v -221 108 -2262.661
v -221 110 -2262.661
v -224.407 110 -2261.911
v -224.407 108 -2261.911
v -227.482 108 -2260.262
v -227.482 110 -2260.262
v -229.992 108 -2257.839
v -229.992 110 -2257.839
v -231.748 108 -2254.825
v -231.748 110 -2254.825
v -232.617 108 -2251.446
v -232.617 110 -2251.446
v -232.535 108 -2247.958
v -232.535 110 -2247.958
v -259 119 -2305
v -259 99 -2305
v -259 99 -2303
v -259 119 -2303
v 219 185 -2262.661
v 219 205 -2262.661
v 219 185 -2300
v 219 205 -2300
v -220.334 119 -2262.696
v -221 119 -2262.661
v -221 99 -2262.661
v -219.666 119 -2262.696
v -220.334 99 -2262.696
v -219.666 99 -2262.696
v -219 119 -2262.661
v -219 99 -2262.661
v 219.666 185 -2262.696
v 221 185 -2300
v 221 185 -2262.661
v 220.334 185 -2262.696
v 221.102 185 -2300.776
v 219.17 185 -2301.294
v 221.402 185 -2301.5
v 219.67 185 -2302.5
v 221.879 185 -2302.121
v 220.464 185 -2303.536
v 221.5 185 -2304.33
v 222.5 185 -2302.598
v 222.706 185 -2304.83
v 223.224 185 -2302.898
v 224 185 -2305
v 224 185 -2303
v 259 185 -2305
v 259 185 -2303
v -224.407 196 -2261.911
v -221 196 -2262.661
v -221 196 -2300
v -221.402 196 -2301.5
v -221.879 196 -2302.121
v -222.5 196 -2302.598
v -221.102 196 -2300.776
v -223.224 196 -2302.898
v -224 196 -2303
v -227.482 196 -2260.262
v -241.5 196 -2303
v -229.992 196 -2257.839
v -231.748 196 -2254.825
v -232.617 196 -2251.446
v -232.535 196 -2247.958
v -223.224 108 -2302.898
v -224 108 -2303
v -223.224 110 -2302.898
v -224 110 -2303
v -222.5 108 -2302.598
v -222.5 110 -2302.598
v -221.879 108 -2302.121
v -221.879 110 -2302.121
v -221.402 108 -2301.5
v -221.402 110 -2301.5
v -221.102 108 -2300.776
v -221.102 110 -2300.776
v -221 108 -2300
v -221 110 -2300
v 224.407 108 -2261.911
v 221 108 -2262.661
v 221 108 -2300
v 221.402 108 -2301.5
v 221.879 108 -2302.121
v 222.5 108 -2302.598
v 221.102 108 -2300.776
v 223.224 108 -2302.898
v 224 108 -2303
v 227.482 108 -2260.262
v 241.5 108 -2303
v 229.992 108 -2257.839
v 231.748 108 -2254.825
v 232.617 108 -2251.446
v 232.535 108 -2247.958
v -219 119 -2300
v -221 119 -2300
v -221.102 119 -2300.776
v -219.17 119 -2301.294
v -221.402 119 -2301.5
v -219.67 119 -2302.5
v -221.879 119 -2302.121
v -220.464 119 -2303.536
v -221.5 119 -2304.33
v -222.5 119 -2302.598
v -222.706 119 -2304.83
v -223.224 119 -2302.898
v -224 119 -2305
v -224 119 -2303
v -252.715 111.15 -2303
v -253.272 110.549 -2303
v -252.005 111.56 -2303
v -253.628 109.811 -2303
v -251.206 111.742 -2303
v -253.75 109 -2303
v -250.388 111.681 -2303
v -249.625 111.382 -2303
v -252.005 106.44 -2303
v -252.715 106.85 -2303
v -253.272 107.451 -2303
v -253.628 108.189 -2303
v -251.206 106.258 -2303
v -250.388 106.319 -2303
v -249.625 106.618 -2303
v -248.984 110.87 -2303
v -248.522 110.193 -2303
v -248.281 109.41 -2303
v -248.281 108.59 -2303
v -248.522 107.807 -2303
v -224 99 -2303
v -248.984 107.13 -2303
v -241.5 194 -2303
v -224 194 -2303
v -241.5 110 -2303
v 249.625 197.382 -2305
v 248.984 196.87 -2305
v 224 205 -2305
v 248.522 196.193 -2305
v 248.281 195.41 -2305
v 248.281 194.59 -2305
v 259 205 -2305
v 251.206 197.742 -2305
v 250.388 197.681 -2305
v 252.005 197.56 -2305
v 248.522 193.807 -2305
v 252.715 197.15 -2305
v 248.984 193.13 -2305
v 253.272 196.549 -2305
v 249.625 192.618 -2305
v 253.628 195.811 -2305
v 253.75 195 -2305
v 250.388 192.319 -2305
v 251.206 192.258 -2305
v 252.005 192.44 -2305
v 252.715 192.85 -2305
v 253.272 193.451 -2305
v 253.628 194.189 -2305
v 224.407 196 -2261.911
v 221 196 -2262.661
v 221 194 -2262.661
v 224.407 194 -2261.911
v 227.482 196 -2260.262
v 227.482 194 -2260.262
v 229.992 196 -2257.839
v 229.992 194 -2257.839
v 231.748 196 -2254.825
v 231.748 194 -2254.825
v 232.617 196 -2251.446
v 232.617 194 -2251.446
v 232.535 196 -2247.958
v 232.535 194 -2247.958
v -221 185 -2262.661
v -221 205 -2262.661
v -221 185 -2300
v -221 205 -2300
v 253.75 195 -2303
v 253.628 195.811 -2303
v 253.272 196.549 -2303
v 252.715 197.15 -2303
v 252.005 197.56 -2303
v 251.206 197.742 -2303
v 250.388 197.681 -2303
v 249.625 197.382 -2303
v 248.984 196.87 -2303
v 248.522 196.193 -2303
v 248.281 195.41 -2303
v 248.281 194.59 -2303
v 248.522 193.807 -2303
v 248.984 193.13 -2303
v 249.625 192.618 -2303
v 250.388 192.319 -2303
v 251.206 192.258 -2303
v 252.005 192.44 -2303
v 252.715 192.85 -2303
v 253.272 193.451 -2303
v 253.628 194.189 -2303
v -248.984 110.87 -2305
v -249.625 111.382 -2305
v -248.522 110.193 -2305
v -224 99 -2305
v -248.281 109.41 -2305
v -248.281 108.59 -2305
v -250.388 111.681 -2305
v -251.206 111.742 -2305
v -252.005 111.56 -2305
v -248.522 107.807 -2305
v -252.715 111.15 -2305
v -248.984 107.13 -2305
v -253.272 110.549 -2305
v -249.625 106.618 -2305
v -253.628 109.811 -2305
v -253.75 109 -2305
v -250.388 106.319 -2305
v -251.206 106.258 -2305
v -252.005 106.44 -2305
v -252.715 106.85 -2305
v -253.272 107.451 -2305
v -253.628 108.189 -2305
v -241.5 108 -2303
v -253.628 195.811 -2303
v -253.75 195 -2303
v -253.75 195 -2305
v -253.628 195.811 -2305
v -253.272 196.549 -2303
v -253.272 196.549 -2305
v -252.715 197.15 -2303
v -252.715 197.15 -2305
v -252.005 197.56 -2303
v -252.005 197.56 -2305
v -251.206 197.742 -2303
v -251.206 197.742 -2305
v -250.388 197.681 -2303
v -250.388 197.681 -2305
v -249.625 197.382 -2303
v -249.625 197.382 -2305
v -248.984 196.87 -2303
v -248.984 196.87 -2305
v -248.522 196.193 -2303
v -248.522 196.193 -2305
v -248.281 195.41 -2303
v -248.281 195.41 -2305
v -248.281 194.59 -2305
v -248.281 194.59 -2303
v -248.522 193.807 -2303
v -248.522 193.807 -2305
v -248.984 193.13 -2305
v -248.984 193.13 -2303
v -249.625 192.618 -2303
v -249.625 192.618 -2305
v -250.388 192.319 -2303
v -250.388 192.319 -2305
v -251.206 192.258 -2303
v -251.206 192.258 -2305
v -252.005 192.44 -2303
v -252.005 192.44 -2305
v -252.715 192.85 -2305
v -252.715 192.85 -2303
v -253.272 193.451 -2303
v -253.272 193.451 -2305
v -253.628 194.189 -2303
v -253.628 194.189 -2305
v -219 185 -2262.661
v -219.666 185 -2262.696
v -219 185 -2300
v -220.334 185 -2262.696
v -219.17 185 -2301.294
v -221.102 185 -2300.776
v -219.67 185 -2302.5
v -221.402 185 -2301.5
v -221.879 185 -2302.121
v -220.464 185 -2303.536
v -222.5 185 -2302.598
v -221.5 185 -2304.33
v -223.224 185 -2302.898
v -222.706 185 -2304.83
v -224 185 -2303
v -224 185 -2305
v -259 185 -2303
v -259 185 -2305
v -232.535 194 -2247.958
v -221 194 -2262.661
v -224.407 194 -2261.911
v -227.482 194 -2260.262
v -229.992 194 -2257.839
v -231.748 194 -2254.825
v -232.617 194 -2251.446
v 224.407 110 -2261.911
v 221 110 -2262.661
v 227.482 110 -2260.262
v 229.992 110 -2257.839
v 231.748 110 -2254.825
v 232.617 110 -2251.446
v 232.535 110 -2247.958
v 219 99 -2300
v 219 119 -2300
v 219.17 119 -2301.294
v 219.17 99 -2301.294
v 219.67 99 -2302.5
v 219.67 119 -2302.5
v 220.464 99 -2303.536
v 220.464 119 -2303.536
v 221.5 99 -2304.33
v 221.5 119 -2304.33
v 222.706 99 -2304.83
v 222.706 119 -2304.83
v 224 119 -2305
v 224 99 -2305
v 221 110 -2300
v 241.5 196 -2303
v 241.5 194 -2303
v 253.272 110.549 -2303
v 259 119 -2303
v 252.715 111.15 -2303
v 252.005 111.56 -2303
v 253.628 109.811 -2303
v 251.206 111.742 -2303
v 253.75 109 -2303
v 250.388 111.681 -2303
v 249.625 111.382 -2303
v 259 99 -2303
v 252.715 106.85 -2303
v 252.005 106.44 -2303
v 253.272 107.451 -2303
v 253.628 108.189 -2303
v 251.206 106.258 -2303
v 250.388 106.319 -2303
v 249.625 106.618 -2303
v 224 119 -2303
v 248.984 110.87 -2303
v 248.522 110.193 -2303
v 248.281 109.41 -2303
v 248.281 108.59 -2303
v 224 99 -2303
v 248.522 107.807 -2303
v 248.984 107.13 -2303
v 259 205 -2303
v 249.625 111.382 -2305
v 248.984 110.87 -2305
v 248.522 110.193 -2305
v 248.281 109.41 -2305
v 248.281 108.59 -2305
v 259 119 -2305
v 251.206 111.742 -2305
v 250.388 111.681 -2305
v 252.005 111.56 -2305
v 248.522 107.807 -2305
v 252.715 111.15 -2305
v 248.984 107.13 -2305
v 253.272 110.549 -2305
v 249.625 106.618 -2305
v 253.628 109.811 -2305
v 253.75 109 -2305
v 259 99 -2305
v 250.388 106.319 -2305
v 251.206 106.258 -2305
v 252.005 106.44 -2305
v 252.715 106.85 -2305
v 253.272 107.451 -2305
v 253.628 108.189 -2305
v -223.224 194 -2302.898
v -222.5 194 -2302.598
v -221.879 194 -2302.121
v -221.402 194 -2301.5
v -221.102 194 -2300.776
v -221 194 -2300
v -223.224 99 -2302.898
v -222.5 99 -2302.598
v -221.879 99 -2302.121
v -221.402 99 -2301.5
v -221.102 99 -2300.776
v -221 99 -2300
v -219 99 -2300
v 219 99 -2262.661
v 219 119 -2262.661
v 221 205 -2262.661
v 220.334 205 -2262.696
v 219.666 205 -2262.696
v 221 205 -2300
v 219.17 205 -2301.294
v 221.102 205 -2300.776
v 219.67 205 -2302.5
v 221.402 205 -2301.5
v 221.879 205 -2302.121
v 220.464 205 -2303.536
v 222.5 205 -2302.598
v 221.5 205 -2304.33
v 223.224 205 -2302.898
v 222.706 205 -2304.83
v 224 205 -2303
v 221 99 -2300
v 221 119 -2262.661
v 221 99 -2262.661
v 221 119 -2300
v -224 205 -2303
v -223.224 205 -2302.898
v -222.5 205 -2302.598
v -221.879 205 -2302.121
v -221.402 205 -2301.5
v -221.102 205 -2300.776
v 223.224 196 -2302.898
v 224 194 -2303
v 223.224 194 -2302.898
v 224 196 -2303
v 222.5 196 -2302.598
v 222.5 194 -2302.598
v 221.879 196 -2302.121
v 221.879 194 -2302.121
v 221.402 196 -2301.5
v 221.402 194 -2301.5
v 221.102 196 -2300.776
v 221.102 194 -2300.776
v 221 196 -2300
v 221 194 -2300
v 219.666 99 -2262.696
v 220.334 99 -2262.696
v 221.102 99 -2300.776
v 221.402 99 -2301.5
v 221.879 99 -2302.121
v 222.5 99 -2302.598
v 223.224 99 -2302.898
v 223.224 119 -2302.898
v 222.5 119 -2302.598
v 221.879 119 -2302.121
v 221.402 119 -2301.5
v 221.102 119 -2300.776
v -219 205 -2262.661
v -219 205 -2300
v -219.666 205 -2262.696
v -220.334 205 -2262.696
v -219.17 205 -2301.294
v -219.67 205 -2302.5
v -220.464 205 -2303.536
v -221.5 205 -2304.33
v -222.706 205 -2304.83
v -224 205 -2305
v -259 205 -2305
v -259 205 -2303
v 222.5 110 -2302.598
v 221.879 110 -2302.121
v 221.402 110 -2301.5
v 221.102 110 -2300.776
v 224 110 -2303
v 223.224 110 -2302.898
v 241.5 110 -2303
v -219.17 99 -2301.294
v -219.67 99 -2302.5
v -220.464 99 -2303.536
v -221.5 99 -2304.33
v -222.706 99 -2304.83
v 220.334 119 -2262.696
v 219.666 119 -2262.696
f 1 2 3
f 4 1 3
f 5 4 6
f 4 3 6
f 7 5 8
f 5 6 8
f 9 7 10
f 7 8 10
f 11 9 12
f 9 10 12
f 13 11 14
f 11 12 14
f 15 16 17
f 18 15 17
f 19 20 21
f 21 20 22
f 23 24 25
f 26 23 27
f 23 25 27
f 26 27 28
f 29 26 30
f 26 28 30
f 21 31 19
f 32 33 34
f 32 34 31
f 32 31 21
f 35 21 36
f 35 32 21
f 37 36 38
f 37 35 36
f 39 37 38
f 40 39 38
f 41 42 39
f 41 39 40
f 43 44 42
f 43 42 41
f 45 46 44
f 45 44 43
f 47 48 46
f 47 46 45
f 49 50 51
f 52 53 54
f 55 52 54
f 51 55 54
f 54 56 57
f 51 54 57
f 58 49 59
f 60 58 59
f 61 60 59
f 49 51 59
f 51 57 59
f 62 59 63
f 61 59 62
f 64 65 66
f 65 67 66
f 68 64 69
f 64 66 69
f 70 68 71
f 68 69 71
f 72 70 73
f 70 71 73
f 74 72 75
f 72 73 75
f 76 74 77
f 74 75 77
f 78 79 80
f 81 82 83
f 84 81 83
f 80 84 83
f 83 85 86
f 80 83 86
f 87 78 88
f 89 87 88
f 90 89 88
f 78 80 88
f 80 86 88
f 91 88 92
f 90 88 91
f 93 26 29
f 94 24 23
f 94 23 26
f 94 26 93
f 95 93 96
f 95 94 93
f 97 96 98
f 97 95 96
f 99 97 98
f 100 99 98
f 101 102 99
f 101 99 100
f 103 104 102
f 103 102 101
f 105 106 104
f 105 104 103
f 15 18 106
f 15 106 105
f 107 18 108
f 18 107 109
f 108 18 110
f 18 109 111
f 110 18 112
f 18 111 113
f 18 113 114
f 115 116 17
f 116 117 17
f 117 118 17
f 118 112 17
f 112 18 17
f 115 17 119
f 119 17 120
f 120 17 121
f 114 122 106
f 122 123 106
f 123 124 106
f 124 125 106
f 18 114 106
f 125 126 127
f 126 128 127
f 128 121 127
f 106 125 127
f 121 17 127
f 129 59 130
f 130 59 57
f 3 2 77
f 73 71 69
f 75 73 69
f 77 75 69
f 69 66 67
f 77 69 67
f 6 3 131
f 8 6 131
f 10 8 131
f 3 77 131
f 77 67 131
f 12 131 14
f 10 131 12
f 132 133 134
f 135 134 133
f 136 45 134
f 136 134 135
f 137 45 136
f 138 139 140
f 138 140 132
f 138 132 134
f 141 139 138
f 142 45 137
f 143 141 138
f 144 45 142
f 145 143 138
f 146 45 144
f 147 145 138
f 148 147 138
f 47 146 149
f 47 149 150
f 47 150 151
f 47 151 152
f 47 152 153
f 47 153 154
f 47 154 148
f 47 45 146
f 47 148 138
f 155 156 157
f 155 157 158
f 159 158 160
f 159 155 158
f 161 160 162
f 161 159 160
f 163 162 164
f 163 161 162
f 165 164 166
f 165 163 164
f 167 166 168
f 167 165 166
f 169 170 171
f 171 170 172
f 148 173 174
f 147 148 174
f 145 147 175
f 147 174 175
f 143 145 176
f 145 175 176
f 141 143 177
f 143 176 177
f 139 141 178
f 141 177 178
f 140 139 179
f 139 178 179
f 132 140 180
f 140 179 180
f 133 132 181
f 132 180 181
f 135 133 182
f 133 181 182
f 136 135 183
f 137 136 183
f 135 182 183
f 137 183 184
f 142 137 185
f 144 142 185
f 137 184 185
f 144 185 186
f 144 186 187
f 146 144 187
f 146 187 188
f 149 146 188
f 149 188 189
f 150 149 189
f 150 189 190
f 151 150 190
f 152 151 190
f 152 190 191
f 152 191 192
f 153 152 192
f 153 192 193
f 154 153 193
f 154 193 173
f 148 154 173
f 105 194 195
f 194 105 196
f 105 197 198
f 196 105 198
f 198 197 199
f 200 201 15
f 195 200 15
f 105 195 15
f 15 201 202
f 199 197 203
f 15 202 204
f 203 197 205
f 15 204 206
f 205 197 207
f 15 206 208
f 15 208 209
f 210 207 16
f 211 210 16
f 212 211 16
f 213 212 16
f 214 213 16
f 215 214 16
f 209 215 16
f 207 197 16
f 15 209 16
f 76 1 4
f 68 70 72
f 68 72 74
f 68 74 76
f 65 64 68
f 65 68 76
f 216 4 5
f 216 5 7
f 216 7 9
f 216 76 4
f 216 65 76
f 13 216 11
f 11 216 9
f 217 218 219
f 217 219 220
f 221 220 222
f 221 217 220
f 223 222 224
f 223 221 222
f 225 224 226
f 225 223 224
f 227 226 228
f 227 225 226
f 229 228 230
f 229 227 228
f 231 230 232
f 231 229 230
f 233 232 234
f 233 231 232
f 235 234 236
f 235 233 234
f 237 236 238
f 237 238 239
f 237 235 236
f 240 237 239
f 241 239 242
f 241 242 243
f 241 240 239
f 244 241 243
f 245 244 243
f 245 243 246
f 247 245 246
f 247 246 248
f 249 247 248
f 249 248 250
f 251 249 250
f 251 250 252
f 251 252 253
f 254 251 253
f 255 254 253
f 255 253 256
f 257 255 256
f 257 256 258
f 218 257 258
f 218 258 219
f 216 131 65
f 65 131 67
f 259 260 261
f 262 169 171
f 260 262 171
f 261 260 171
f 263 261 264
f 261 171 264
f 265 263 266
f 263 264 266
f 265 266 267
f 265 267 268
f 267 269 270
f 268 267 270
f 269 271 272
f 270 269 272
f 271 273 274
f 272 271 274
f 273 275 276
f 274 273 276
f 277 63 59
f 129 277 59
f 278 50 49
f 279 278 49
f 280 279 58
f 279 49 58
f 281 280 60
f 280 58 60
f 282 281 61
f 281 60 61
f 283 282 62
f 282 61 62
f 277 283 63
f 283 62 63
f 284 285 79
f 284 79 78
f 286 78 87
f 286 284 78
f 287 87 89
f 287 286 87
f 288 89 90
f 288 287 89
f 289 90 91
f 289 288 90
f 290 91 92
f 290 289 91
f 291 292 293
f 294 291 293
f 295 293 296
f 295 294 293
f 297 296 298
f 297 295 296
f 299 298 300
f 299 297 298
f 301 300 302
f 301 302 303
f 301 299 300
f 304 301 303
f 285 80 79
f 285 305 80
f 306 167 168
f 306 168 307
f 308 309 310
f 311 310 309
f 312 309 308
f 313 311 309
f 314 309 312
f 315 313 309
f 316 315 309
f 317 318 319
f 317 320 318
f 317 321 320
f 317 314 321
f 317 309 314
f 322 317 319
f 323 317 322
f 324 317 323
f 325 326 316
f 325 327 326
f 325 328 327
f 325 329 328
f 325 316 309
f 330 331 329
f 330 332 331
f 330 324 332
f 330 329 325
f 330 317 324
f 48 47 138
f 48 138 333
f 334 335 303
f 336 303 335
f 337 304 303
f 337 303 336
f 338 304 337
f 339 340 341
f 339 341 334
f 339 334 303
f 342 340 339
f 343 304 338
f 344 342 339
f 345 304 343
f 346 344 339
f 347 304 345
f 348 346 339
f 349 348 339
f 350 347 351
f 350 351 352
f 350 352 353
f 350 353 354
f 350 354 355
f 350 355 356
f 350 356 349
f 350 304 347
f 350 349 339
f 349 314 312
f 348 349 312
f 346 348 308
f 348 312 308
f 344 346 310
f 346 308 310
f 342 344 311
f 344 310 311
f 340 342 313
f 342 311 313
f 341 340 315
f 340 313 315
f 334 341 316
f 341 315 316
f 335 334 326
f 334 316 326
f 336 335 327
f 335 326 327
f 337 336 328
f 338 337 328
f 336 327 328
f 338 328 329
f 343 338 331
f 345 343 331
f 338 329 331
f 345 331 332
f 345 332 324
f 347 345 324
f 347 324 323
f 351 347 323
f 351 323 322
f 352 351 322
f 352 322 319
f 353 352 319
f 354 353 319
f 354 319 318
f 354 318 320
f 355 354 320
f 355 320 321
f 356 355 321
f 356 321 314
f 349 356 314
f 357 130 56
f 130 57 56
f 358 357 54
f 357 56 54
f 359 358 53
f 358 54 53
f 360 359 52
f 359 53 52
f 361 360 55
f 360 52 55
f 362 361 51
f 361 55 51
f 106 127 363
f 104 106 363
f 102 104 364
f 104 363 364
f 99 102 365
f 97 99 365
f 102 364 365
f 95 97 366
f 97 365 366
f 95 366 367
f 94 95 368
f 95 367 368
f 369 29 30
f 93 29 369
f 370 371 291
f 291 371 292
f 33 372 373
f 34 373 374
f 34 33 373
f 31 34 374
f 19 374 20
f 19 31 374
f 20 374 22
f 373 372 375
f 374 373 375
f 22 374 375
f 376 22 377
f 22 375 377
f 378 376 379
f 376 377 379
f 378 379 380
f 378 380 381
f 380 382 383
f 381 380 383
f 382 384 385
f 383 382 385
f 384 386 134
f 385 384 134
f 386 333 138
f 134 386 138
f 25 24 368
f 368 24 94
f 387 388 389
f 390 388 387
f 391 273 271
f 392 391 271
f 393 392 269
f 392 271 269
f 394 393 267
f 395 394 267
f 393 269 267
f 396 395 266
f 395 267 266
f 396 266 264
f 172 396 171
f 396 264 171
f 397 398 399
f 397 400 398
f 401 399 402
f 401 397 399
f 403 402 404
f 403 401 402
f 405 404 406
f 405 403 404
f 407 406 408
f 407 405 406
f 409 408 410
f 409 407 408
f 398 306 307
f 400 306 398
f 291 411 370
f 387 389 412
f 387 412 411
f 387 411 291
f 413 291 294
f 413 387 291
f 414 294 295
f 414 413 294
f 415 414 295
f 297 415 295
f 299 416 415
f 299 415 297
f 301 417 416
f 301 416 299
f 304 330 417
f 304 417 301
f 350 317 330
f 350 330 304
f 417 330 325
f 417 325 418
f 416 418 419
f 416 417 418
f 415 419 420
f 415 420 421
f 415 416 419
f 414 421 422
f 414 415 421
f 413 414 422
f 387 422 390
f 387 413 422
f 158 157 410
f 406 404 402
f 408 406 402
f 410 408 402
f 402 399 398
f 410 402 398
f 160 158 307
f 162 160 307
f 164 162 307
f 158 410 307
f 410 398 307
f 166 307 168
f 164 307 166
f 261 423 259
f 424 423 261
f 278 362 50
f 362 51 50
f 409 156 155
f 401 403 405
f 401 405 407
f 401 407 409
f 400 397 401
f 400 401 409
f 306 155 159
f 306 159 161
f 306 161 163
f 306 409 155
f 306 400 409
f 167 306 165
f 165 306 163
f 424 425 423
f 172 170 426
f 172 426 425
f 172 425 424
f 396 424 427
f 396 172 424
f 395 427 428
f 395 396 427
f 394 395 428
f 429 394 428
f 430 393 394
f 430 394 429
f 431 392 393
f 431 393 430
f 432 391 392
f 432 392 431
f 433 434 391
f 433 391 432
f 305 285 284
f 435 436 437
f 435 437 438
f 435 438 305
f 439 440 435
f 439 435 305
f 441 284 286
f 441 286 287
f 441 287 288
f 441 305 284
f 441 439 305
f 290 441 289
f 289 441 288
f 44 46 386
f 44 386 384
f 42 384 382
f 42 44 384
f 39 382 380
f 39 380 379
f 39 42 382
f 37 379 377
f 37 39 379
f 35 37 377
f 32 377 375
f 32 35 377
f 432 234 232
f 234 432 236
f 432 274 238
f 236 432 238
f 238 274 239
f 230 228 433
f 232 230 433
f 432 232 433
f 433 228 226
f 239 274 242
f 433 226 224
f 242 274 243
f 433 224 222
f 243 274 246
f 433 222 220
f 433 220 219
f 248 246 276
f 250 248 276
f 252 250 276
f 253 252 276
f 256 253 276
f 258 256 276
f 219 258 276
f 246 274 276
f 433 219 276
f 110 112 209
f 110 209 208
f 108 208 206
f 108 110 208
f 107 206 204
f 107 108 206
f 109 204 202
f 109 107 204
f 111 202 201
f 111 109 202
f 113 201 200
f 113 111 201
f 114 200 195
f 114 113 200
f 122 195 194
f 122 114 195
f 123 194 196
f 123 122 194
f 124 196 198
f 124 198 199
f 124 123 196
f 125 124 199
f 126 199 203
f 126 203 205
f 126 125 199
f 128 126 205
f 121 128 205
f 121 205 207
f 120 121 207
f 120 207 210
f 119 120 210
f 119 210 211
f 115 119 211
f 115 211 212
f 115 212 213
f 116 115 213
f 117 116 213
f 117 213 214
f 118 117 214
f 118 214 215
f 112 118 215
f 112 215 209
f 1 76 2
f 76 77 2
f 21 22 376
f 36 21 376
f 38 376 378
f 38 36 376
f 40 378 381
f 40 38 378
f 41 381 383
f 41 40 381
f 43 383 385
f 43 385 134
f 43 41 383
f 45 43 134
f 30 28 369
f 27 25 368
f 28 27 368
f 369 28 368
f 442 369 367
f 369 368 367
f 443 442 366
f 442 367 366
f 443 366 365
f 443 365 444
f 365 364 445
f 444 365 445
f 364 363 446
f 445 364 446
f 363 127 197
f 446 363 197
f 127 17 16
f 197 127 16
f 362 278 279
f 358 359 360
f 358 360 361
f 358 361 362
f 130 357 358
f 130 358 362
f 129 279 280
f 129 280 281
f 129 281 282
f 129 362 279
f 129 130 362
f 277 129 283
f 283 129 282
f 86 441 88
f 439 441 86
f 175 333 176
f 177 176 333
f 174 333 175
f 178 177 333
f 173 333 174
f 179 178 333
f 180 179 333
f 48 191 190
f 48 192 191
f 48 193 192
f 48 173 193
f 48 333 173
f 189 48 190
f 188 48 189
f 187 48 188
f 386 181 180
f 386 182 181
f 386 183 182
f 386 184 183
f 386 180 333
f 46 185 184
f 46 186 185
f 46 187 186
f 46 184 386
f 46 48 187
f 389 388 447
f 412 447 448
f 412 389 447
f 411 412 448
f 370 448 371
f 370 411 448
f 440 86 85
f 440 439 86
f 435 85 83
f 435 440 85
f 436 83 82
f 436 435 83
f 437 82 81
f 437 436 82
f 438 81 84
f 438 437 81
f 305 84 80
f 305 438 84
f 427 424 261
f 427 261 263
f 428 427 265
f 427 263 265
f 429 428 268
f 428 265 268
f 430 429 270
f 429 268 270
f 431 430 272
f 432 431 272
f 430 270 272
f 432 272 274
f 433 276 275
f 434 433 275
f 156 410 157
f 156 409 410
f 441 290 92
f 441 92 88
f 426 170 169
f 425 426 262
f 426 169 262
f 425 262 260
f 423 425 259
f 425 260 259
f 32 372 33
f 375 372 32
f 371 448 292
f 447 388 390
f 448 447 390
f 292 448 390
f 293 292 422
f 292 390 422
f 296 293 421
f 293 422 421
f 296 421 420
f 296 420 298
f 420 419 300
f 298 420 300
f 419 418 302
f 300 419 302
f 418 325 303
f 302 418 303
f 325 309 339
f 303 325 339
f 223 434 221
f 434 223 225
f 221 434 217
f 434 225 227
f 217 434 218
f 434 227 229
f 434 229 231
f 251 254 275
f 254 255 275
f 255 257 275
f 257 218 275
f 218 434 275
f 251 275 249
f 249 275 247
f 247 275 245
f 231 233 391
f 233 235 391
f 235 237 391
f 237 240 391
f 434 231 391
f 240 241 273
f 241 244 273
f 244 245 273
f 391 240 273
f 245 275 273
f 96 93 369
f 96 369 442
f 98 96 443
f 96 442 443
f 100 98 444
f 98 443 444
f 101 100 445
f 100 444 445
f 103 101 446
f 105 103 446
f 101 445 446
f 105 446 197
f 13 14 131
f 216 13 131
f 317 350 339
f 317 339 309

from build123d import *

# Parameters (mm, degrees)
SKETCH3_W                = 50
SKETCH3_H                = 20
BASE_FLANGE1_DEPTH       = 2
EDGE_FLANGE1_DEPTH       = 20
BOSS_EXTRUDE2_DEPTH      = 1
SKETCH19_R               = 2.75
CUT_EXTRUDE1_DEPTH       = 48
INDENT1_START            = 185
INDENT1_DEPTH            = 20
BODY_DELETE_KEEP_START   = 185
BODY_DELETE_KEEP_1_DEPTH = 20
LPATTERN1_COUNT          = 2
LPATTERN1_PITCH          = 86


# Read off the part's stored shape, not the designer's step: Indent1, Body-Delete/Keep 1
# Sheet-metal steps are written as plain solids
with BuildPart() as part:
    # Sketch3 → Base-Flange1 (new body)
    with BuildSketch(Plane(origin=(221, 0, 0), x_dir=(0, 0, -1), z_dir=(1, 0, 0))):
        with Locations((2275, 195)):
            Rectangle(SKETCH3_W, SKETCH3_H)
    extrude(amount=-BASE_FLANGE1_DEPTH)

    # Edge-Flange1 section (across the edge) → Edge-Flange1 (add)
    with BuildSketch(Plane(origin=(221, 185, -2303), x_dir=(0, 0, 1), z_dir=(0, 1, 0))):
        with BuildLine():
            Line((-2, 3), (-2, 38))
            Line((-2, 38), (0, 38))
            Line((0, 38), (0, 3))
            ThreePointArc((0, 3), (0.878679656, 0.878679656), (3, 0))
            Line((3, 0), (3, -2))
            ThreePointArc((3, -2), (-0.535533906, -0.535533906), (-2, 3))
        make_face()
    extrude(amount=EDGE_FLANGE1_DEPTH)

    # Sketch19 → Cut-Extrude1 (cut)
    with BuildSketch(Plane.XY.offset(-2303)):
        with Locations((251, 195)):
            Circle(SKETCH19_R)
    extrude(amount=-CUT_EXTRUDE1_DEPTH, mode=Mode.SUBTRACT)

    # Indent1 outline → Indent1 (cut)
    with BuildSketch(Plane(origin=(0, 0, 0), x_dir=(1, 0, 0), z_dir=(0, 1, 0)).offset(INDENT1_START)):
        with BuildLine():
            Line((221, 2261.356055653), (221, 2262.660568708))
            ThreePointArc((221, 2262.660568708), (220, 2262.7), (219, 2262.660568708))
            Line((219, 2262.660568708), (219, 2261.356055653))
            ThreePointArc((219, 2261.356055653), (220, 2261.4), (221, 2261.356055653))
        make_face()
    extrude(amount=INDENT1_DEPTH, mode=Mode.SUBTRACT)

    # Body-Delete/Keep 1 outline → Body-Delete/Keep 1 (cut)
    with BuildSketch(Plane(origin=(0, 0, 0), x_dir=(1, 0, 0), z_dir=(0, 1, 0)).offset(BODY_DELETE_KEEP_START)):
        with BuildLine():
            ThreePointArc((221, 2261.356055653), (220, 2261.4), (219, 2261.356055653))
            Line((219, 2261.356055653), (219, 2250))
            Line((219, 2250), (221, 2250))
            Line((221, 2250), (221, 2261.356055653))
        make_face()
    extrude(amount=BODY_DELETE_KEEP_1_DEPTH, mode=Mode.SUBTRACT)


with BuildPart() as body_2:
    # Sketch11 → Boss-Extrude2 (new, symmetric)
    with BuildSketch(Plane(origin=(0, 195, 0), x_dir=(1, 0, 0), z_dir=(0, 1, 0))):
        with BuildLine():
            Line((221, 2300), (221, 2262.660568708))
            ThreePointArc((221, 2262.660568708), (229.991834673, 2257.839211686), (232.534814834, 2247.958329831))
            Line((232.534814834, 2247.958329831), (241.5, 2303))
            Line((241.5, 2303), (224, 2303))
            ThreePointArc((224, 2303), (221.878679656, 2302.121320344), (221, 2300))
        make_face()
    extrude(amount=BOSS_EXTRUDE2_DEPTH, both=True)


with BuildPart() as lpattern1_1:
    # LPattern1: pattern copy
    add(part.part.moved(Location(Vector(0, -1, 0) * (1 * LPATTERN1_PITCH))))


with BuildPart() as lpattern1_2:
    # LPattern1: pattern copy
    add(body_2.part.moved(Location(Vector(0, -1, 0) * (1 * LPATTERN1_PITCH))))


with BuildPart() as body_5:
    # Mirror1: mirrored copy
    add(part.part.mirror(Plane(origin=(0, 0, 0), x_dir=(0, 0, 1), z_dir=(1, 0, 0))))


with BuildPart() as body_6:
    # Mirror1 2: mirrored copy
    add(body_2.part.mirror(Plane(origin=(0, 0, 0), x_dir=(0, 0, 1), z_dir=(1, 0, 0))))


with BuildPart() as body_7:
    # Mirror1 3: mirrored copy
    add(lpattern1_1.part.mirror(Plane(origin=(0, 0, 0), x_dir=(0, 0, 1), z_dir=(1, 0, 0))))


with BuildPart() as body_8:
    # Mirror1 4: mirrored copy
    add(lpattern1_2.part.mirror(Plane(origin=(0, 0, 0), x_dir=(0, 0, 1), z_dir=(1, 0, 0))))


solid = Compound([part.part, body_2.part, lpattern1_1.part, lpattern1_2.part, body_5.part, body_6.part, body_7.part, body_8.part])
